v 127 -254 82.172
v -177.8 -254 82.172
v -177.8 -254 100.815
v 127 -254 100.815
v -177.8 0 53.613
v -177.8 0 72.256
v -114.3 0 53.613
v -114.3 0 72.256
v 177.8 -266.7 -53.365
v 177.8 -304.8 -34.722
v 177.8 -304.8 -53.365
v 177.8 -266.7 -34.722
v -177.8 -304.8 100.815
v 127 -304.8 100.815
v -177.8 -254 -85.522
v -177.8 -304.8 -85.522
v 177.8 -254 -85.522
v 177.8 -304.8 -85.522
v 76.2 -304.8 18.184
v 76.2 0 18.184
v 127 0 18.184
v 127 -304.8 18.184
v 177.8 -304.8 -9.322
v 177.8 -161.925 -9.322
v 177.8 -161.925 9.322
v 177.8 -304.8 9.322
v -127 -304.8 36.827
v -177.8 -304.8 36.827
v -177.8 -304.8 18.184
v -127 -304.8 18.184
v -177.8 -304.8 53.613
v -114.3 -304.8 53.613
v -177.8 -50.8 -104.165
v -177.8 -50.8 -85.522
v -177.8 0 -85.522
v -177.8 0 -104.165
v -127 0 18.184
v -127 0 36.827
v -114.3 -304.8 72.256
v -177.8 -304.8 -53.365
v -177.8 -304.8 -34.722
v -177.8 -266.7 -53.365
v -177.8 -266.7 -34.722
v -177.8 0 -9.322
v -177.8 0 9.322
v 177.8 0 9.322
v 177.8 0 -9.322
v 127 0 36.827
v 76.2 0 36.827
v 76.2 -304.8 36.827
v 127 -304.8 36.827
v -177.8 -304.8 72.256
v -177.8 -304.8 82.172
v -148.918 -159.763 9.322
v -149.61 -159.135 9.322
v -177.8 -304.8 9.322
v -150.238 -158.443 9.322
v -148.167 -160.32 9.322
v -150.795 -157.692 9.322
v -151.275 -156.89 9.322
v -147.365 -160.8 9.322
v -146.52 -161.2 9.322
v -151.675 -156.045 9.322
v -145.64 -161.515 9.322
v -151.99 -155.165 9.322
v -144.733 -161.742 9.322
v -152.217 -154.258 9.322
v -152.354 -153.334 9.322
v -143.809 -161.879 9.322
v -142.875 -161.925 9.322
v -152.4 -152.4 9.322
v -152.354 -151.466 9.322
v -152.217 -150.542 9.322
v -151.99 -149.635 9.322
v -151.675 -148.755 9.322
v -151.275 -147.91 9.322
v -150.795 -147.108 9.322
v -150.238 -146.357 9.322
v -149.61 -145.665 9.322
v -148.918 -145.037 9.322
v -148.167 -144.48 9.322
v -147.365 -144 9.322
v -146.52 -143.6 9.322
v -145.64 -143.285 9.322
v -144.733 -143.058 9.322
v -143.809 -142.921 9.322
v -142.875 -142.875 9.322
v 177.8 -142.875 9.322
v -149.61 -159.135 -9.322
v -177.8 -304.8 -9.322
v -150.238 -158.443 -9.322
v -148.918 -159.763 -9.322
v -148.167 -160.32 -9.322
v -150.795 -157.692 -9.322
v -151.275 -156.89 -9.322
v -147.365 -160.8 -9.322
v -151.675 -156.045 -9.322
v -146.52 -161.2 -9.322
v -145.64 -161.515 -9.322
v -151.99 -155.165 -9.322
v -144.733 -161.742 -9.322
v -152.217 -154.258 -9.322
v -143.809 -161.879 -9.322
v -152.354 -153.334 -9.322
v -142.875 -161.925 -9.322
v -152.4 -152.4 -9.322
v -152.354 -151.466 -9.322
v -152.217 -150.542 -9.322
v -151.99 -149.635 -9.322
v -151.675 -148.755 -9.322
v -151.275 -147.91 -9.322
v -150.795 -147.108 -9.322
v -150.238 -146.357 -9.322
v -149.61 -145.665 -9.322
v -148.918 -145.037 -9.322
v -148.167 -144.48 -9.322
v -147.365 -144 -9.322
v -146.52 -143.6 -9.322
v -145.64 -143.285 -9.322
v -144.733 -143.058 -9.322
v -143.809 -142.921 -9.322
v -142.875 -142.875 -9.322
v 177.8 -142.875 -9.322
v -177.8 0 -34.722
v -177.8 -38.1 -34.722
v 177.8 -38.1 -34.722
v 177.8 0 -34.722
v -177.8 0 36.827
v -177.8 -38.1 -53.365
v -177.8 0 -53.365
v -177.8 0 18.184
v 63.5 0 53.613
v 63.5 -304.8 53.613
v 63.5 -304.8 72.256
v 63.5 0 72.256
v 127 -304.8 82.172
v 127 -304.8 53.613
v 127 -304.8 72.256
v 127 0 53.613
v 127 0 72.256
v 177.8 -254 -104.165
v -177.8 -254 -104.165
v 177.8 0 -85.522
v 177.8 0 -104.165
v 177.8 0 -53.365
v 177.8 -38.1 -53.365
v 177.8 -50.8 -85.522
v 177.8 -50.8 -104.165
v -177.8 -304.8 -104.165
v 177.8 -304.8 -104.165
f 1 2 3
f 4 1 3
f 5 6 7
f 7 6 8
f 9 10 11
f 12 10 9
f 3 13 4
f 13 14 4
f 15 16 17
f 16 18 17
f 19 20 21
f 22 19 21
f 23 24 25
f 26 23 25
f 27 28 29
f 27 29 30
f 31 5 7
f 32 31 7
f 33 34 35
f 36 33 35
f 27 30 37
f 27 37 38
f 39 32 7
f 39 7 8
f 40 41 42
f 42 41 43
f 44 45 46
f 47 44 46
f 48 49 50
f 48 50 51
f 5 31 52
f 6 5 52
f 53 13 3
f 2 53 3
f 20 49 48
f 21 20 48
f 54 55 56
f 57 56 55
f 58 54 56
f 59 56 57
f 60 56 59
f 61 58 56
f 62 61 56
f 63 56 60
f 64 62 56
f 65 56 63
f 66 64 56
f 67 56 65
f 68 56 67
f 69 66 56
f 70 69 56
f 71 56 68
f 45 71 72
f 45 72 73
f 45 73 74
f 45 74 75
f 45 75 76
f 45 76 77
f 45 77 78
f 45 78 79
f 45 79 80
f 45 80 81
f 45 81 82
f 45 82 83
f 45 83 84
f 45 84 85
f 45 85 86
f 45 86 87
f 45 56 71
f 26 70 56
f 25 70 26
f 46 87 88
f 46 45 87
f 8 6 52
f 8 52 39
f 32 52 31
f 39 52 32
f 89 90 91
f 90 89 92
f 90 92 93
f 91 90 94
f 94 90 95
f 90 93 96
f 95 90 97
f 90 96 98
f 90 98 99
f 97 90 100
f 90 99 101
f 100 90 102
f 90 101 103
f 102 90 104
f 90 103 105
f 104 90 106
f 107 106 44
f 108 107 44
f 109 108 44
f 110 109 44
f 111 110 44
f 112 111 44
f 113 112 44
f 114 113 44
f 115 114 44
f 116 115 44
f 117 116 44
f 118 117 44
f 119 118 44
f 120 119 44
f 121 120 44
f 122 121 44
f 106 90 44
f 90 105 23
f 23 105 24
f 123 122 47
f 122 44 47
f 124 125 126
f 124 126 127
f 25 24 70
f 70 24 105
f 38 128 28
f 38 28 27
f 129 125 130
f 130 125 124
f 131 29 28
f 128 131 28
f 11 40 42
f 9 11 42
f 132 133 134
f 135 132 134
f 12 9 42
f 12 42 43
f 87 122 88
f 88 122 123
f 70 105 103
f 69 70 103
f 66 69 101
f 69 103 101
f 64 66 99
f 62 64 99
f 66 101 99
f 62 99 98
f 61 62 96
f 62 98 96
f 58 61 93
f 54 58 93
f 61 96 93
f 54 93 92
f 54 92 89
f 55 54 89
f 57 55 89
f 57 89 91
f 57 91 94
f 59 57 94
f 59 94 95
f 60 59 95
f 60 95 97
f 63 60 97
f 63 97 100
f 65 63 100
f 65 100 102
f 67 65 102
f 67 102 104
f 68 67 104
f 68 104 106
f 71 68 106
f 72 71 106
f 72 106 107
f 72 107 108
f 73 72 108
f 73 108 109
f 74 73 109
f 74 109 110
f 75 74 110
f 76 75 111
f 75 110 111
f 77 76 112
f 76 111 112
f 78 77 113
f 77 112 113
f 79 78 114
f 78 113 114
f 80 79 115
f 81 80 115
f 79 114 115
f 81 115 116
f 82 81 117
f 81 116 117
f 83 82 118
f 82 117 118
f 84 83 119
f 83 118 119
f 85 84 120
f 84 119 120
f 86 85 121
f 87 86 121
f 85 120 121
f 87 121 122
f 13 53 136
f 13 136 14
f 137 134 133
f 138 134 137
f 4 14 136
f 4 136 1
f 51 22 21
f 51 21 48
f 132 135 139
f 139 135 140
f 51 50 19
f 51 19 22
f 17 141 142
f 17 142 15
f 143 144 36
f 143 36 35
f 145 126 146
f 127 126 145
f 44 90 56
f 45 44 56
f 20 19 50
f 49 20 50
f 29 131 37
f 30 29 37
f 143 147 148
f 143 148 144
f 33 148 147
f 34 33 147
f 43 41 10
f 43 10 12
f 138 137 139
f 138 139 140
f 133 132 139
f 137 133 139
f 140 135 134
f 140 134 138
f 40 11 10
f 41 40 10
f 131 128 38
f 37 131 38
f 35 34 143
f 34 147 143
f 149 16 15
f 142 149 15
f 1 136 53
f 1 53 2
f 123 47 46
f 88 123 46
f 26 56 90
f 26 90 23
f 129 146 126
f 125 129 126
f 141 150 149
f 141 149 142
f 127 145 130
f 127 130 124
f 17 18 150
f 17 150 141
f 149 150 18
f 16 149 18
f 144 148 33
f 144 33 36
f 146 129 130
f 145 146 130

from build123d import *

# Parameters (mm, degrees)
F0_W          = 63.5
F0_H          = 18.6436
F1_DEPTH      = 304.8
F0_W_2        = 50.8
F0_W_3        = 355.6
F3_DEPTH      = 81.5790404614
F4_W          = 50.8
F4_H          = 18.6436
F5_DEPTH      = 177.8
F4_W_2        = 38.1
F6_W          = 50.8
F6_H          = 18.6436
F7_DEPTH      = 127
F7_DEPTH_BACK = 177.8


with BuildPart() as f1:
    # F0 (on Front) → F1 (new body)
    with BuildSketch(Plane.XZ):
        with Locations((-146.05, 62.9344404614)):
            Rectangle(F0_W, F0_H)
    extrude(amount=F1_DEPTH)


with BuildPart() as f1b:
    # F0 (on Front) → F1, piece 2 (new body)
    with BuildSketch(Plane.XZ):
        with Locations((-152.4, 27.5055062211)):
            Rectangle(F0_W_2, F0_H)
    extrude(amount=F1_DEPTH)


with BuildPart() as f1c:
    # F0 (on Front) → F1, piece 3 (new body)
    with BuildSketch(Plane.XZ):
        Rectangle(F0_W_3, F0_H)
    extrude(amount=F1_DEPTH)

    # F2 (on face) → F3 (cut, through all)
    with BuildSketch(Plane(origin=(0, 0, -9.3218), x_dir=(1, 0, 0), z_dir=(0, 0, -1))):
        with BuildLine():
            Line((177.8, 161.925), (-142.875, 161.925))
            ThreePointArc((-142.875, 161.925), (-152.4, 152.4), (-142.875, 142.875))
            Line((-142.875, 142.875), (177.8, 142.875))
            Line((177.8, 142.875), (177.8, 161.925))
        make_face()
    extrude(amount=-F3_DEPTH, mode=Mode.SUBTRACT)


with BuildPart() as f1d:
    # F0 (on Front) → F1, piece 4 (new body)
    with BuildSketch(Plane.XZ):
        with Locations((101.6, 27.5055062211)):
            Rectangle(F0_W_2, F0_H)
    extrude(amount=F1_DEPTH)


with BuildPart() as f1e:
    # F0 (on Front) → F1, piece 5 (new body)
    with BuildSketch(Plane.XZ):
        with Locations((95.25, 62.9344404614)):
            Rectangle(F0_W, F0_H)
    extrude(amount=F1_DEPTH)


with BuildPart() as f5:
    # F4 (on Right) → F5 (new body, symmetric)
    with BuildSketch(Plane.YZ):
        with Locations((-25.4, -94.8436)):
            Rectangle(F4_W, F4_H)
    extrude(amount=F5_DEPTH, both=True)


with BuildPart() as f5b:
    # F4 (on Right) → F5, piece 2 (new body, symmetric)
    with BuildSketch(Plane.YZ):
        with Locations((-279.4, -94.8436)):
            Rectangle(F4_W, F4_H)
    extrude(amount=F5_DEPTH, both=True)


with BuildPart() as f5c:
    # F4 (on Right) → F5, piece 3 (new body, symmetric)
    with BuildSketch(Plane.YZ):
        with Locations((-285.75, -44.0436)):
            Rectangle(F4_W_2, F4_H)
    extrude(amount=F5_DEPTH, both=True)


with BuildPart() as f5d:
    # F4 (on Right) → F5, piece 4 (new body, symmetric)
    with BuildSketch(Plane.YZ):
        with Locations((-19.05, -44.0436)):
            Rectangle(F4_W_2, F4_H)
    extrude(amount=F5_DEPTH, both=True)


with BuildPart() as f7:
    # F6 (on Right) → F7 (new body, two sides)
    with BuildSketch(Plane.YZ) as f7_sk:
        with Locations((-279.4, 91.4935171604)):
            Rectangle(F6_W, F6_H)
    extrude(amount=F7_DEPTH)
    extrude(f7_sk.sketch, amount=-F7_DEPTH_BACK)


solid = Compound([f1.part, f1b.part, f1c.part, f1d.part, f1e.part, f5.part, f5b.part, f5c.part, f5d.part, f7.part])
